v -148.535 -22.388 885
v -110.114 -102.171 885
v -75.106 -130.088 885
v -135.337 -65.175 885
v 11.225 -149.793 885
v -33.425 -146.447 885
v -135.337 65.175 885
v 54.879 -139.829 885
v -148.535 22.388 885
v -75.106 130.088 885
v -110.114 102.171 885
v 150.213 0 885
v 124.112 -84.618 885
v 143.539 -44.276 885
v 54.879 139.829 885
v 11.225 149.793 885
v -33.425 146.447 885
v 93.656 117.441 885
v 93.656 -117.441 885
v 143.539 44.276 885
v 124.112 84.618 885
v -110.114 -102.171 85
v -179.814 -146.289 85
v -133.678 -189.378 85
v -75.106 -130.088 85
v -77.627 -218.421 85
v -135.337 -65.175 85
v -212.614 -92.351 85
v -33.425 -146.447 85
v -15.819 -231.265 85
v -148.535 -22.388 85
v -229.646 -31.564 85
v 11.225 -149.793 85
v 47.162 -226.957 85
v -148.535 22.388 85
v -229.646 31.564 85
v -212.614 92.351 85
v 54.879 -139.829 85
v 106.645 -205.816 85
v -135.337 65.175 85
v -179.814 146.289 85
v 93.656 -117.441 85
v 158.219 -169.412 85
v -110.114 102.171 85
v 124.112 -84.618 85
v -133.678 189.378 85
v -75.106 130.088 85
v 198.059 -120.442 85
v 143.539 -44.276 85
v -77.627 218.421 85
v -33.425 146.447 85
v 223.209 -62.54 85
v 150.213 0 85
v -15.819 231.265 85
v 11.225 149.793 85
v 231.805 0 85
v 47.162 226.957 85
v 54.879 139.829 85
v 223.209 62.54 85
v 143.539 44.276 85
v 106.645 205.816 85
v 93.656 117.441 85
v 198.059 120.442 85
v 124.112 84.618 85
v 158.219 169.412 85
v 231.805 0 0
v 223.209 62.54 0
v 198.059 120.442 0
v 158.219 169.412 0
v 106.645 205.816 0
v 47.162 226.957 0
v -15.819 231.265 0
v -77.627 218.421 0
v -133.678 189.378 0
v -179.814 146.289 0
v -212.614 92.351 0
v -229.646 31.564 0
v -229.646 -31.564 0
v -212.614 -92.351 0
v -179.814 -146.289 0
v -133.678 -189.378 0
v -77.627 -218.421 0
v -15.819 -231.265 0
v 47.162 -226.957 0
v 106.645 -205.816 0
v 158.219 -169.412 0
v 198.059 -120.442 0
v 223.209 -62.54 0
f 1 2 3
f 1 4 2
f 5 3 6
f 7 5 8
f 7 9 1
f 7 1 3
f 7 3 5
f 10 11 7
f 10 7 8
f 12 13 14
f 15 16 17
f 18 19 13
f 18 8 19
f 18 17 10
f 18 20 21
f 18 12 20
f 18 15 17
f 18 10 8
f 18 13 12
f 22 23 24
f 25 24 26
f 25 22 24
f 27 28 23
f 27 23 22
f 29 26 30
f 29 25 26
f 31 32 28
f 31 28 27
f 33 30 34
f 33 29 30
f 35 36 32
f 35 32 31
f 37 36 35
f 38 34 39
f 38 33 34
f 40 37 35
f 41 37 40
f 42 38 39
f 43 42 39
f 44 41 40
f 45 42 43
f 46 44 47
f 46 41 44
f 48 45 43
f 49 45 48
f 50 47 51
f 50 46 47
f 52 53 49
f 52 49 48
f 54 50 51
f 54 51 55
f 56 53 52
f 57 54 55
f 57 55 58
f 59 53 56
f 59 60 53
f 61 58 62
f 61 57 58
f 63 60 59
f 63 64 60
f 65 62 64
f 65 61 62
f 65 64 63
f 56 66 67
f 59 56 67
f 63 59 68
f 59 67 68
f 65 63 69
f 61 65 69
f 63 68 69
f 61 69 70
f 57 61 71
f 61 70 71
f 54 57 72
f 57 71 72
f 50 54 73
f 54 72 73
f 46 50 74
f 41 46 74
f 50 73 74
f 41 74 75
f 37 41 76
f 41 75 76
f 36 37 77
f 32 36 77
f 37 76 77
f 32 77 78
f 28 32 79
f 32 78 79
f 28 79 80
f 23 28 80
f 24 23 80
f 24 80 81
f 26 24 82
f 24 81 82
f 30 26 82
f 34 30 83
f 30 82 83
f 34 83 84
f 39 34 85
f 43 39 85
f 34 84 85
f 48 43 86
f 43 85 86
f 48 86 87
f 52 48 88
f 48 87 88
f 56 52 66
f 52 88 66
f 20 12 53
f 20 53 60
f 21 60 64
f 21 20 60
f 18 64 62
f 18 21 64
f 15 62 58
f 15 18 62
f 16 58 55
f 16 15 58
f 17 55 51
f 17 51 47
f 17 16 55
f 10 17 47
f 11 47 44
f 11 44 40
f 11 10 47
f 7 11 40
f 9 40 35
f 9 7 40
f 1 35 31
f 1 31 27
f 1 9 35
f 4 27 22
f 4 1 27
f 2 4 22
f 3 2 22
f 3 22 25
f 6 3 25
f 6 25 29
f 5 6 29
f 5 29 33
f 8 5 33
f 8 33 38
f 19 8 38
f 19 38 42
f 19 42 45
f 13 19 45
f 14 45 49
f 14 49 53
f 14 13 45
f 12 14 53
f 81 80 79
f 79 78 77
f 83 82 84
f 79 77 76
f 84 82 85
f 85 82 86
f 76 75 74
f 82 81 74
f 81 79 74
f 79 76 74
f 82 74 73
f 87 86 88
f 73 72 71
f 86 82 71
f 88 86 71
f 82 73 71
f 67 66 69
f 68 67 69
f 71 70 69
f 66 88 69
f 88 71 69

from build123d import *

# Parameters (mm, degrees)
SKETCH1_R           = 231.80521347
BOSS_EXTRUDE1_DEPTH = 85
SKETCH2_W           = 215.150125982
SKETCH2_H           = 209.680207524
BOSS_EXTRUDE3_DEPTH = 800
SKETCH3_R           = 35
CUT_EXTRUDE1_DEPTH  = 248
SKETCH4_R           = 150.212654375
BOSS_EXTRUDE5_DEPTH = 885


with BuildPart() as part:
    # Sketch1 → Boss-Extrude1 (new body)
    with BuildSketch(Plane.XY):
        Circle(SKETCH1_R)
    extrude(amount=BOSS_EXTRUDE1_DEPTH)

    # Sketch2 → Boss-Extrude3 (add)
    with BuildSketch(Plane.XY.offset(85)):
        Rectangle(SKETCH2_W, SKETCH2_H)
    extrude(amount=BOSS_EXTRUDE3_DEPTH)

    # Sketch3 → Cut-Extrude1 (cut)
    with BuildSketch(Plane(origin=(107.575062991, 0, 0), x_dir=(0, 0, -1), z_dir=(1, 0, 0))):
        with Locations((-795.184826294, 0)):
            Circle(SKETCH3_R)
    extrude(amount=-CUT_EXTRUDE1_DEPTH, mode=Mode.SUBTRACT)

    # Sketch4 → Boss-Extrude5 (add)
    with BuildSketch(Plane.XY.offset(885)):
        Circle(SKETCH4_R)
    extrude(amount=-BOSS_EXTRUDE5_DEPTH)


solid = part.part
